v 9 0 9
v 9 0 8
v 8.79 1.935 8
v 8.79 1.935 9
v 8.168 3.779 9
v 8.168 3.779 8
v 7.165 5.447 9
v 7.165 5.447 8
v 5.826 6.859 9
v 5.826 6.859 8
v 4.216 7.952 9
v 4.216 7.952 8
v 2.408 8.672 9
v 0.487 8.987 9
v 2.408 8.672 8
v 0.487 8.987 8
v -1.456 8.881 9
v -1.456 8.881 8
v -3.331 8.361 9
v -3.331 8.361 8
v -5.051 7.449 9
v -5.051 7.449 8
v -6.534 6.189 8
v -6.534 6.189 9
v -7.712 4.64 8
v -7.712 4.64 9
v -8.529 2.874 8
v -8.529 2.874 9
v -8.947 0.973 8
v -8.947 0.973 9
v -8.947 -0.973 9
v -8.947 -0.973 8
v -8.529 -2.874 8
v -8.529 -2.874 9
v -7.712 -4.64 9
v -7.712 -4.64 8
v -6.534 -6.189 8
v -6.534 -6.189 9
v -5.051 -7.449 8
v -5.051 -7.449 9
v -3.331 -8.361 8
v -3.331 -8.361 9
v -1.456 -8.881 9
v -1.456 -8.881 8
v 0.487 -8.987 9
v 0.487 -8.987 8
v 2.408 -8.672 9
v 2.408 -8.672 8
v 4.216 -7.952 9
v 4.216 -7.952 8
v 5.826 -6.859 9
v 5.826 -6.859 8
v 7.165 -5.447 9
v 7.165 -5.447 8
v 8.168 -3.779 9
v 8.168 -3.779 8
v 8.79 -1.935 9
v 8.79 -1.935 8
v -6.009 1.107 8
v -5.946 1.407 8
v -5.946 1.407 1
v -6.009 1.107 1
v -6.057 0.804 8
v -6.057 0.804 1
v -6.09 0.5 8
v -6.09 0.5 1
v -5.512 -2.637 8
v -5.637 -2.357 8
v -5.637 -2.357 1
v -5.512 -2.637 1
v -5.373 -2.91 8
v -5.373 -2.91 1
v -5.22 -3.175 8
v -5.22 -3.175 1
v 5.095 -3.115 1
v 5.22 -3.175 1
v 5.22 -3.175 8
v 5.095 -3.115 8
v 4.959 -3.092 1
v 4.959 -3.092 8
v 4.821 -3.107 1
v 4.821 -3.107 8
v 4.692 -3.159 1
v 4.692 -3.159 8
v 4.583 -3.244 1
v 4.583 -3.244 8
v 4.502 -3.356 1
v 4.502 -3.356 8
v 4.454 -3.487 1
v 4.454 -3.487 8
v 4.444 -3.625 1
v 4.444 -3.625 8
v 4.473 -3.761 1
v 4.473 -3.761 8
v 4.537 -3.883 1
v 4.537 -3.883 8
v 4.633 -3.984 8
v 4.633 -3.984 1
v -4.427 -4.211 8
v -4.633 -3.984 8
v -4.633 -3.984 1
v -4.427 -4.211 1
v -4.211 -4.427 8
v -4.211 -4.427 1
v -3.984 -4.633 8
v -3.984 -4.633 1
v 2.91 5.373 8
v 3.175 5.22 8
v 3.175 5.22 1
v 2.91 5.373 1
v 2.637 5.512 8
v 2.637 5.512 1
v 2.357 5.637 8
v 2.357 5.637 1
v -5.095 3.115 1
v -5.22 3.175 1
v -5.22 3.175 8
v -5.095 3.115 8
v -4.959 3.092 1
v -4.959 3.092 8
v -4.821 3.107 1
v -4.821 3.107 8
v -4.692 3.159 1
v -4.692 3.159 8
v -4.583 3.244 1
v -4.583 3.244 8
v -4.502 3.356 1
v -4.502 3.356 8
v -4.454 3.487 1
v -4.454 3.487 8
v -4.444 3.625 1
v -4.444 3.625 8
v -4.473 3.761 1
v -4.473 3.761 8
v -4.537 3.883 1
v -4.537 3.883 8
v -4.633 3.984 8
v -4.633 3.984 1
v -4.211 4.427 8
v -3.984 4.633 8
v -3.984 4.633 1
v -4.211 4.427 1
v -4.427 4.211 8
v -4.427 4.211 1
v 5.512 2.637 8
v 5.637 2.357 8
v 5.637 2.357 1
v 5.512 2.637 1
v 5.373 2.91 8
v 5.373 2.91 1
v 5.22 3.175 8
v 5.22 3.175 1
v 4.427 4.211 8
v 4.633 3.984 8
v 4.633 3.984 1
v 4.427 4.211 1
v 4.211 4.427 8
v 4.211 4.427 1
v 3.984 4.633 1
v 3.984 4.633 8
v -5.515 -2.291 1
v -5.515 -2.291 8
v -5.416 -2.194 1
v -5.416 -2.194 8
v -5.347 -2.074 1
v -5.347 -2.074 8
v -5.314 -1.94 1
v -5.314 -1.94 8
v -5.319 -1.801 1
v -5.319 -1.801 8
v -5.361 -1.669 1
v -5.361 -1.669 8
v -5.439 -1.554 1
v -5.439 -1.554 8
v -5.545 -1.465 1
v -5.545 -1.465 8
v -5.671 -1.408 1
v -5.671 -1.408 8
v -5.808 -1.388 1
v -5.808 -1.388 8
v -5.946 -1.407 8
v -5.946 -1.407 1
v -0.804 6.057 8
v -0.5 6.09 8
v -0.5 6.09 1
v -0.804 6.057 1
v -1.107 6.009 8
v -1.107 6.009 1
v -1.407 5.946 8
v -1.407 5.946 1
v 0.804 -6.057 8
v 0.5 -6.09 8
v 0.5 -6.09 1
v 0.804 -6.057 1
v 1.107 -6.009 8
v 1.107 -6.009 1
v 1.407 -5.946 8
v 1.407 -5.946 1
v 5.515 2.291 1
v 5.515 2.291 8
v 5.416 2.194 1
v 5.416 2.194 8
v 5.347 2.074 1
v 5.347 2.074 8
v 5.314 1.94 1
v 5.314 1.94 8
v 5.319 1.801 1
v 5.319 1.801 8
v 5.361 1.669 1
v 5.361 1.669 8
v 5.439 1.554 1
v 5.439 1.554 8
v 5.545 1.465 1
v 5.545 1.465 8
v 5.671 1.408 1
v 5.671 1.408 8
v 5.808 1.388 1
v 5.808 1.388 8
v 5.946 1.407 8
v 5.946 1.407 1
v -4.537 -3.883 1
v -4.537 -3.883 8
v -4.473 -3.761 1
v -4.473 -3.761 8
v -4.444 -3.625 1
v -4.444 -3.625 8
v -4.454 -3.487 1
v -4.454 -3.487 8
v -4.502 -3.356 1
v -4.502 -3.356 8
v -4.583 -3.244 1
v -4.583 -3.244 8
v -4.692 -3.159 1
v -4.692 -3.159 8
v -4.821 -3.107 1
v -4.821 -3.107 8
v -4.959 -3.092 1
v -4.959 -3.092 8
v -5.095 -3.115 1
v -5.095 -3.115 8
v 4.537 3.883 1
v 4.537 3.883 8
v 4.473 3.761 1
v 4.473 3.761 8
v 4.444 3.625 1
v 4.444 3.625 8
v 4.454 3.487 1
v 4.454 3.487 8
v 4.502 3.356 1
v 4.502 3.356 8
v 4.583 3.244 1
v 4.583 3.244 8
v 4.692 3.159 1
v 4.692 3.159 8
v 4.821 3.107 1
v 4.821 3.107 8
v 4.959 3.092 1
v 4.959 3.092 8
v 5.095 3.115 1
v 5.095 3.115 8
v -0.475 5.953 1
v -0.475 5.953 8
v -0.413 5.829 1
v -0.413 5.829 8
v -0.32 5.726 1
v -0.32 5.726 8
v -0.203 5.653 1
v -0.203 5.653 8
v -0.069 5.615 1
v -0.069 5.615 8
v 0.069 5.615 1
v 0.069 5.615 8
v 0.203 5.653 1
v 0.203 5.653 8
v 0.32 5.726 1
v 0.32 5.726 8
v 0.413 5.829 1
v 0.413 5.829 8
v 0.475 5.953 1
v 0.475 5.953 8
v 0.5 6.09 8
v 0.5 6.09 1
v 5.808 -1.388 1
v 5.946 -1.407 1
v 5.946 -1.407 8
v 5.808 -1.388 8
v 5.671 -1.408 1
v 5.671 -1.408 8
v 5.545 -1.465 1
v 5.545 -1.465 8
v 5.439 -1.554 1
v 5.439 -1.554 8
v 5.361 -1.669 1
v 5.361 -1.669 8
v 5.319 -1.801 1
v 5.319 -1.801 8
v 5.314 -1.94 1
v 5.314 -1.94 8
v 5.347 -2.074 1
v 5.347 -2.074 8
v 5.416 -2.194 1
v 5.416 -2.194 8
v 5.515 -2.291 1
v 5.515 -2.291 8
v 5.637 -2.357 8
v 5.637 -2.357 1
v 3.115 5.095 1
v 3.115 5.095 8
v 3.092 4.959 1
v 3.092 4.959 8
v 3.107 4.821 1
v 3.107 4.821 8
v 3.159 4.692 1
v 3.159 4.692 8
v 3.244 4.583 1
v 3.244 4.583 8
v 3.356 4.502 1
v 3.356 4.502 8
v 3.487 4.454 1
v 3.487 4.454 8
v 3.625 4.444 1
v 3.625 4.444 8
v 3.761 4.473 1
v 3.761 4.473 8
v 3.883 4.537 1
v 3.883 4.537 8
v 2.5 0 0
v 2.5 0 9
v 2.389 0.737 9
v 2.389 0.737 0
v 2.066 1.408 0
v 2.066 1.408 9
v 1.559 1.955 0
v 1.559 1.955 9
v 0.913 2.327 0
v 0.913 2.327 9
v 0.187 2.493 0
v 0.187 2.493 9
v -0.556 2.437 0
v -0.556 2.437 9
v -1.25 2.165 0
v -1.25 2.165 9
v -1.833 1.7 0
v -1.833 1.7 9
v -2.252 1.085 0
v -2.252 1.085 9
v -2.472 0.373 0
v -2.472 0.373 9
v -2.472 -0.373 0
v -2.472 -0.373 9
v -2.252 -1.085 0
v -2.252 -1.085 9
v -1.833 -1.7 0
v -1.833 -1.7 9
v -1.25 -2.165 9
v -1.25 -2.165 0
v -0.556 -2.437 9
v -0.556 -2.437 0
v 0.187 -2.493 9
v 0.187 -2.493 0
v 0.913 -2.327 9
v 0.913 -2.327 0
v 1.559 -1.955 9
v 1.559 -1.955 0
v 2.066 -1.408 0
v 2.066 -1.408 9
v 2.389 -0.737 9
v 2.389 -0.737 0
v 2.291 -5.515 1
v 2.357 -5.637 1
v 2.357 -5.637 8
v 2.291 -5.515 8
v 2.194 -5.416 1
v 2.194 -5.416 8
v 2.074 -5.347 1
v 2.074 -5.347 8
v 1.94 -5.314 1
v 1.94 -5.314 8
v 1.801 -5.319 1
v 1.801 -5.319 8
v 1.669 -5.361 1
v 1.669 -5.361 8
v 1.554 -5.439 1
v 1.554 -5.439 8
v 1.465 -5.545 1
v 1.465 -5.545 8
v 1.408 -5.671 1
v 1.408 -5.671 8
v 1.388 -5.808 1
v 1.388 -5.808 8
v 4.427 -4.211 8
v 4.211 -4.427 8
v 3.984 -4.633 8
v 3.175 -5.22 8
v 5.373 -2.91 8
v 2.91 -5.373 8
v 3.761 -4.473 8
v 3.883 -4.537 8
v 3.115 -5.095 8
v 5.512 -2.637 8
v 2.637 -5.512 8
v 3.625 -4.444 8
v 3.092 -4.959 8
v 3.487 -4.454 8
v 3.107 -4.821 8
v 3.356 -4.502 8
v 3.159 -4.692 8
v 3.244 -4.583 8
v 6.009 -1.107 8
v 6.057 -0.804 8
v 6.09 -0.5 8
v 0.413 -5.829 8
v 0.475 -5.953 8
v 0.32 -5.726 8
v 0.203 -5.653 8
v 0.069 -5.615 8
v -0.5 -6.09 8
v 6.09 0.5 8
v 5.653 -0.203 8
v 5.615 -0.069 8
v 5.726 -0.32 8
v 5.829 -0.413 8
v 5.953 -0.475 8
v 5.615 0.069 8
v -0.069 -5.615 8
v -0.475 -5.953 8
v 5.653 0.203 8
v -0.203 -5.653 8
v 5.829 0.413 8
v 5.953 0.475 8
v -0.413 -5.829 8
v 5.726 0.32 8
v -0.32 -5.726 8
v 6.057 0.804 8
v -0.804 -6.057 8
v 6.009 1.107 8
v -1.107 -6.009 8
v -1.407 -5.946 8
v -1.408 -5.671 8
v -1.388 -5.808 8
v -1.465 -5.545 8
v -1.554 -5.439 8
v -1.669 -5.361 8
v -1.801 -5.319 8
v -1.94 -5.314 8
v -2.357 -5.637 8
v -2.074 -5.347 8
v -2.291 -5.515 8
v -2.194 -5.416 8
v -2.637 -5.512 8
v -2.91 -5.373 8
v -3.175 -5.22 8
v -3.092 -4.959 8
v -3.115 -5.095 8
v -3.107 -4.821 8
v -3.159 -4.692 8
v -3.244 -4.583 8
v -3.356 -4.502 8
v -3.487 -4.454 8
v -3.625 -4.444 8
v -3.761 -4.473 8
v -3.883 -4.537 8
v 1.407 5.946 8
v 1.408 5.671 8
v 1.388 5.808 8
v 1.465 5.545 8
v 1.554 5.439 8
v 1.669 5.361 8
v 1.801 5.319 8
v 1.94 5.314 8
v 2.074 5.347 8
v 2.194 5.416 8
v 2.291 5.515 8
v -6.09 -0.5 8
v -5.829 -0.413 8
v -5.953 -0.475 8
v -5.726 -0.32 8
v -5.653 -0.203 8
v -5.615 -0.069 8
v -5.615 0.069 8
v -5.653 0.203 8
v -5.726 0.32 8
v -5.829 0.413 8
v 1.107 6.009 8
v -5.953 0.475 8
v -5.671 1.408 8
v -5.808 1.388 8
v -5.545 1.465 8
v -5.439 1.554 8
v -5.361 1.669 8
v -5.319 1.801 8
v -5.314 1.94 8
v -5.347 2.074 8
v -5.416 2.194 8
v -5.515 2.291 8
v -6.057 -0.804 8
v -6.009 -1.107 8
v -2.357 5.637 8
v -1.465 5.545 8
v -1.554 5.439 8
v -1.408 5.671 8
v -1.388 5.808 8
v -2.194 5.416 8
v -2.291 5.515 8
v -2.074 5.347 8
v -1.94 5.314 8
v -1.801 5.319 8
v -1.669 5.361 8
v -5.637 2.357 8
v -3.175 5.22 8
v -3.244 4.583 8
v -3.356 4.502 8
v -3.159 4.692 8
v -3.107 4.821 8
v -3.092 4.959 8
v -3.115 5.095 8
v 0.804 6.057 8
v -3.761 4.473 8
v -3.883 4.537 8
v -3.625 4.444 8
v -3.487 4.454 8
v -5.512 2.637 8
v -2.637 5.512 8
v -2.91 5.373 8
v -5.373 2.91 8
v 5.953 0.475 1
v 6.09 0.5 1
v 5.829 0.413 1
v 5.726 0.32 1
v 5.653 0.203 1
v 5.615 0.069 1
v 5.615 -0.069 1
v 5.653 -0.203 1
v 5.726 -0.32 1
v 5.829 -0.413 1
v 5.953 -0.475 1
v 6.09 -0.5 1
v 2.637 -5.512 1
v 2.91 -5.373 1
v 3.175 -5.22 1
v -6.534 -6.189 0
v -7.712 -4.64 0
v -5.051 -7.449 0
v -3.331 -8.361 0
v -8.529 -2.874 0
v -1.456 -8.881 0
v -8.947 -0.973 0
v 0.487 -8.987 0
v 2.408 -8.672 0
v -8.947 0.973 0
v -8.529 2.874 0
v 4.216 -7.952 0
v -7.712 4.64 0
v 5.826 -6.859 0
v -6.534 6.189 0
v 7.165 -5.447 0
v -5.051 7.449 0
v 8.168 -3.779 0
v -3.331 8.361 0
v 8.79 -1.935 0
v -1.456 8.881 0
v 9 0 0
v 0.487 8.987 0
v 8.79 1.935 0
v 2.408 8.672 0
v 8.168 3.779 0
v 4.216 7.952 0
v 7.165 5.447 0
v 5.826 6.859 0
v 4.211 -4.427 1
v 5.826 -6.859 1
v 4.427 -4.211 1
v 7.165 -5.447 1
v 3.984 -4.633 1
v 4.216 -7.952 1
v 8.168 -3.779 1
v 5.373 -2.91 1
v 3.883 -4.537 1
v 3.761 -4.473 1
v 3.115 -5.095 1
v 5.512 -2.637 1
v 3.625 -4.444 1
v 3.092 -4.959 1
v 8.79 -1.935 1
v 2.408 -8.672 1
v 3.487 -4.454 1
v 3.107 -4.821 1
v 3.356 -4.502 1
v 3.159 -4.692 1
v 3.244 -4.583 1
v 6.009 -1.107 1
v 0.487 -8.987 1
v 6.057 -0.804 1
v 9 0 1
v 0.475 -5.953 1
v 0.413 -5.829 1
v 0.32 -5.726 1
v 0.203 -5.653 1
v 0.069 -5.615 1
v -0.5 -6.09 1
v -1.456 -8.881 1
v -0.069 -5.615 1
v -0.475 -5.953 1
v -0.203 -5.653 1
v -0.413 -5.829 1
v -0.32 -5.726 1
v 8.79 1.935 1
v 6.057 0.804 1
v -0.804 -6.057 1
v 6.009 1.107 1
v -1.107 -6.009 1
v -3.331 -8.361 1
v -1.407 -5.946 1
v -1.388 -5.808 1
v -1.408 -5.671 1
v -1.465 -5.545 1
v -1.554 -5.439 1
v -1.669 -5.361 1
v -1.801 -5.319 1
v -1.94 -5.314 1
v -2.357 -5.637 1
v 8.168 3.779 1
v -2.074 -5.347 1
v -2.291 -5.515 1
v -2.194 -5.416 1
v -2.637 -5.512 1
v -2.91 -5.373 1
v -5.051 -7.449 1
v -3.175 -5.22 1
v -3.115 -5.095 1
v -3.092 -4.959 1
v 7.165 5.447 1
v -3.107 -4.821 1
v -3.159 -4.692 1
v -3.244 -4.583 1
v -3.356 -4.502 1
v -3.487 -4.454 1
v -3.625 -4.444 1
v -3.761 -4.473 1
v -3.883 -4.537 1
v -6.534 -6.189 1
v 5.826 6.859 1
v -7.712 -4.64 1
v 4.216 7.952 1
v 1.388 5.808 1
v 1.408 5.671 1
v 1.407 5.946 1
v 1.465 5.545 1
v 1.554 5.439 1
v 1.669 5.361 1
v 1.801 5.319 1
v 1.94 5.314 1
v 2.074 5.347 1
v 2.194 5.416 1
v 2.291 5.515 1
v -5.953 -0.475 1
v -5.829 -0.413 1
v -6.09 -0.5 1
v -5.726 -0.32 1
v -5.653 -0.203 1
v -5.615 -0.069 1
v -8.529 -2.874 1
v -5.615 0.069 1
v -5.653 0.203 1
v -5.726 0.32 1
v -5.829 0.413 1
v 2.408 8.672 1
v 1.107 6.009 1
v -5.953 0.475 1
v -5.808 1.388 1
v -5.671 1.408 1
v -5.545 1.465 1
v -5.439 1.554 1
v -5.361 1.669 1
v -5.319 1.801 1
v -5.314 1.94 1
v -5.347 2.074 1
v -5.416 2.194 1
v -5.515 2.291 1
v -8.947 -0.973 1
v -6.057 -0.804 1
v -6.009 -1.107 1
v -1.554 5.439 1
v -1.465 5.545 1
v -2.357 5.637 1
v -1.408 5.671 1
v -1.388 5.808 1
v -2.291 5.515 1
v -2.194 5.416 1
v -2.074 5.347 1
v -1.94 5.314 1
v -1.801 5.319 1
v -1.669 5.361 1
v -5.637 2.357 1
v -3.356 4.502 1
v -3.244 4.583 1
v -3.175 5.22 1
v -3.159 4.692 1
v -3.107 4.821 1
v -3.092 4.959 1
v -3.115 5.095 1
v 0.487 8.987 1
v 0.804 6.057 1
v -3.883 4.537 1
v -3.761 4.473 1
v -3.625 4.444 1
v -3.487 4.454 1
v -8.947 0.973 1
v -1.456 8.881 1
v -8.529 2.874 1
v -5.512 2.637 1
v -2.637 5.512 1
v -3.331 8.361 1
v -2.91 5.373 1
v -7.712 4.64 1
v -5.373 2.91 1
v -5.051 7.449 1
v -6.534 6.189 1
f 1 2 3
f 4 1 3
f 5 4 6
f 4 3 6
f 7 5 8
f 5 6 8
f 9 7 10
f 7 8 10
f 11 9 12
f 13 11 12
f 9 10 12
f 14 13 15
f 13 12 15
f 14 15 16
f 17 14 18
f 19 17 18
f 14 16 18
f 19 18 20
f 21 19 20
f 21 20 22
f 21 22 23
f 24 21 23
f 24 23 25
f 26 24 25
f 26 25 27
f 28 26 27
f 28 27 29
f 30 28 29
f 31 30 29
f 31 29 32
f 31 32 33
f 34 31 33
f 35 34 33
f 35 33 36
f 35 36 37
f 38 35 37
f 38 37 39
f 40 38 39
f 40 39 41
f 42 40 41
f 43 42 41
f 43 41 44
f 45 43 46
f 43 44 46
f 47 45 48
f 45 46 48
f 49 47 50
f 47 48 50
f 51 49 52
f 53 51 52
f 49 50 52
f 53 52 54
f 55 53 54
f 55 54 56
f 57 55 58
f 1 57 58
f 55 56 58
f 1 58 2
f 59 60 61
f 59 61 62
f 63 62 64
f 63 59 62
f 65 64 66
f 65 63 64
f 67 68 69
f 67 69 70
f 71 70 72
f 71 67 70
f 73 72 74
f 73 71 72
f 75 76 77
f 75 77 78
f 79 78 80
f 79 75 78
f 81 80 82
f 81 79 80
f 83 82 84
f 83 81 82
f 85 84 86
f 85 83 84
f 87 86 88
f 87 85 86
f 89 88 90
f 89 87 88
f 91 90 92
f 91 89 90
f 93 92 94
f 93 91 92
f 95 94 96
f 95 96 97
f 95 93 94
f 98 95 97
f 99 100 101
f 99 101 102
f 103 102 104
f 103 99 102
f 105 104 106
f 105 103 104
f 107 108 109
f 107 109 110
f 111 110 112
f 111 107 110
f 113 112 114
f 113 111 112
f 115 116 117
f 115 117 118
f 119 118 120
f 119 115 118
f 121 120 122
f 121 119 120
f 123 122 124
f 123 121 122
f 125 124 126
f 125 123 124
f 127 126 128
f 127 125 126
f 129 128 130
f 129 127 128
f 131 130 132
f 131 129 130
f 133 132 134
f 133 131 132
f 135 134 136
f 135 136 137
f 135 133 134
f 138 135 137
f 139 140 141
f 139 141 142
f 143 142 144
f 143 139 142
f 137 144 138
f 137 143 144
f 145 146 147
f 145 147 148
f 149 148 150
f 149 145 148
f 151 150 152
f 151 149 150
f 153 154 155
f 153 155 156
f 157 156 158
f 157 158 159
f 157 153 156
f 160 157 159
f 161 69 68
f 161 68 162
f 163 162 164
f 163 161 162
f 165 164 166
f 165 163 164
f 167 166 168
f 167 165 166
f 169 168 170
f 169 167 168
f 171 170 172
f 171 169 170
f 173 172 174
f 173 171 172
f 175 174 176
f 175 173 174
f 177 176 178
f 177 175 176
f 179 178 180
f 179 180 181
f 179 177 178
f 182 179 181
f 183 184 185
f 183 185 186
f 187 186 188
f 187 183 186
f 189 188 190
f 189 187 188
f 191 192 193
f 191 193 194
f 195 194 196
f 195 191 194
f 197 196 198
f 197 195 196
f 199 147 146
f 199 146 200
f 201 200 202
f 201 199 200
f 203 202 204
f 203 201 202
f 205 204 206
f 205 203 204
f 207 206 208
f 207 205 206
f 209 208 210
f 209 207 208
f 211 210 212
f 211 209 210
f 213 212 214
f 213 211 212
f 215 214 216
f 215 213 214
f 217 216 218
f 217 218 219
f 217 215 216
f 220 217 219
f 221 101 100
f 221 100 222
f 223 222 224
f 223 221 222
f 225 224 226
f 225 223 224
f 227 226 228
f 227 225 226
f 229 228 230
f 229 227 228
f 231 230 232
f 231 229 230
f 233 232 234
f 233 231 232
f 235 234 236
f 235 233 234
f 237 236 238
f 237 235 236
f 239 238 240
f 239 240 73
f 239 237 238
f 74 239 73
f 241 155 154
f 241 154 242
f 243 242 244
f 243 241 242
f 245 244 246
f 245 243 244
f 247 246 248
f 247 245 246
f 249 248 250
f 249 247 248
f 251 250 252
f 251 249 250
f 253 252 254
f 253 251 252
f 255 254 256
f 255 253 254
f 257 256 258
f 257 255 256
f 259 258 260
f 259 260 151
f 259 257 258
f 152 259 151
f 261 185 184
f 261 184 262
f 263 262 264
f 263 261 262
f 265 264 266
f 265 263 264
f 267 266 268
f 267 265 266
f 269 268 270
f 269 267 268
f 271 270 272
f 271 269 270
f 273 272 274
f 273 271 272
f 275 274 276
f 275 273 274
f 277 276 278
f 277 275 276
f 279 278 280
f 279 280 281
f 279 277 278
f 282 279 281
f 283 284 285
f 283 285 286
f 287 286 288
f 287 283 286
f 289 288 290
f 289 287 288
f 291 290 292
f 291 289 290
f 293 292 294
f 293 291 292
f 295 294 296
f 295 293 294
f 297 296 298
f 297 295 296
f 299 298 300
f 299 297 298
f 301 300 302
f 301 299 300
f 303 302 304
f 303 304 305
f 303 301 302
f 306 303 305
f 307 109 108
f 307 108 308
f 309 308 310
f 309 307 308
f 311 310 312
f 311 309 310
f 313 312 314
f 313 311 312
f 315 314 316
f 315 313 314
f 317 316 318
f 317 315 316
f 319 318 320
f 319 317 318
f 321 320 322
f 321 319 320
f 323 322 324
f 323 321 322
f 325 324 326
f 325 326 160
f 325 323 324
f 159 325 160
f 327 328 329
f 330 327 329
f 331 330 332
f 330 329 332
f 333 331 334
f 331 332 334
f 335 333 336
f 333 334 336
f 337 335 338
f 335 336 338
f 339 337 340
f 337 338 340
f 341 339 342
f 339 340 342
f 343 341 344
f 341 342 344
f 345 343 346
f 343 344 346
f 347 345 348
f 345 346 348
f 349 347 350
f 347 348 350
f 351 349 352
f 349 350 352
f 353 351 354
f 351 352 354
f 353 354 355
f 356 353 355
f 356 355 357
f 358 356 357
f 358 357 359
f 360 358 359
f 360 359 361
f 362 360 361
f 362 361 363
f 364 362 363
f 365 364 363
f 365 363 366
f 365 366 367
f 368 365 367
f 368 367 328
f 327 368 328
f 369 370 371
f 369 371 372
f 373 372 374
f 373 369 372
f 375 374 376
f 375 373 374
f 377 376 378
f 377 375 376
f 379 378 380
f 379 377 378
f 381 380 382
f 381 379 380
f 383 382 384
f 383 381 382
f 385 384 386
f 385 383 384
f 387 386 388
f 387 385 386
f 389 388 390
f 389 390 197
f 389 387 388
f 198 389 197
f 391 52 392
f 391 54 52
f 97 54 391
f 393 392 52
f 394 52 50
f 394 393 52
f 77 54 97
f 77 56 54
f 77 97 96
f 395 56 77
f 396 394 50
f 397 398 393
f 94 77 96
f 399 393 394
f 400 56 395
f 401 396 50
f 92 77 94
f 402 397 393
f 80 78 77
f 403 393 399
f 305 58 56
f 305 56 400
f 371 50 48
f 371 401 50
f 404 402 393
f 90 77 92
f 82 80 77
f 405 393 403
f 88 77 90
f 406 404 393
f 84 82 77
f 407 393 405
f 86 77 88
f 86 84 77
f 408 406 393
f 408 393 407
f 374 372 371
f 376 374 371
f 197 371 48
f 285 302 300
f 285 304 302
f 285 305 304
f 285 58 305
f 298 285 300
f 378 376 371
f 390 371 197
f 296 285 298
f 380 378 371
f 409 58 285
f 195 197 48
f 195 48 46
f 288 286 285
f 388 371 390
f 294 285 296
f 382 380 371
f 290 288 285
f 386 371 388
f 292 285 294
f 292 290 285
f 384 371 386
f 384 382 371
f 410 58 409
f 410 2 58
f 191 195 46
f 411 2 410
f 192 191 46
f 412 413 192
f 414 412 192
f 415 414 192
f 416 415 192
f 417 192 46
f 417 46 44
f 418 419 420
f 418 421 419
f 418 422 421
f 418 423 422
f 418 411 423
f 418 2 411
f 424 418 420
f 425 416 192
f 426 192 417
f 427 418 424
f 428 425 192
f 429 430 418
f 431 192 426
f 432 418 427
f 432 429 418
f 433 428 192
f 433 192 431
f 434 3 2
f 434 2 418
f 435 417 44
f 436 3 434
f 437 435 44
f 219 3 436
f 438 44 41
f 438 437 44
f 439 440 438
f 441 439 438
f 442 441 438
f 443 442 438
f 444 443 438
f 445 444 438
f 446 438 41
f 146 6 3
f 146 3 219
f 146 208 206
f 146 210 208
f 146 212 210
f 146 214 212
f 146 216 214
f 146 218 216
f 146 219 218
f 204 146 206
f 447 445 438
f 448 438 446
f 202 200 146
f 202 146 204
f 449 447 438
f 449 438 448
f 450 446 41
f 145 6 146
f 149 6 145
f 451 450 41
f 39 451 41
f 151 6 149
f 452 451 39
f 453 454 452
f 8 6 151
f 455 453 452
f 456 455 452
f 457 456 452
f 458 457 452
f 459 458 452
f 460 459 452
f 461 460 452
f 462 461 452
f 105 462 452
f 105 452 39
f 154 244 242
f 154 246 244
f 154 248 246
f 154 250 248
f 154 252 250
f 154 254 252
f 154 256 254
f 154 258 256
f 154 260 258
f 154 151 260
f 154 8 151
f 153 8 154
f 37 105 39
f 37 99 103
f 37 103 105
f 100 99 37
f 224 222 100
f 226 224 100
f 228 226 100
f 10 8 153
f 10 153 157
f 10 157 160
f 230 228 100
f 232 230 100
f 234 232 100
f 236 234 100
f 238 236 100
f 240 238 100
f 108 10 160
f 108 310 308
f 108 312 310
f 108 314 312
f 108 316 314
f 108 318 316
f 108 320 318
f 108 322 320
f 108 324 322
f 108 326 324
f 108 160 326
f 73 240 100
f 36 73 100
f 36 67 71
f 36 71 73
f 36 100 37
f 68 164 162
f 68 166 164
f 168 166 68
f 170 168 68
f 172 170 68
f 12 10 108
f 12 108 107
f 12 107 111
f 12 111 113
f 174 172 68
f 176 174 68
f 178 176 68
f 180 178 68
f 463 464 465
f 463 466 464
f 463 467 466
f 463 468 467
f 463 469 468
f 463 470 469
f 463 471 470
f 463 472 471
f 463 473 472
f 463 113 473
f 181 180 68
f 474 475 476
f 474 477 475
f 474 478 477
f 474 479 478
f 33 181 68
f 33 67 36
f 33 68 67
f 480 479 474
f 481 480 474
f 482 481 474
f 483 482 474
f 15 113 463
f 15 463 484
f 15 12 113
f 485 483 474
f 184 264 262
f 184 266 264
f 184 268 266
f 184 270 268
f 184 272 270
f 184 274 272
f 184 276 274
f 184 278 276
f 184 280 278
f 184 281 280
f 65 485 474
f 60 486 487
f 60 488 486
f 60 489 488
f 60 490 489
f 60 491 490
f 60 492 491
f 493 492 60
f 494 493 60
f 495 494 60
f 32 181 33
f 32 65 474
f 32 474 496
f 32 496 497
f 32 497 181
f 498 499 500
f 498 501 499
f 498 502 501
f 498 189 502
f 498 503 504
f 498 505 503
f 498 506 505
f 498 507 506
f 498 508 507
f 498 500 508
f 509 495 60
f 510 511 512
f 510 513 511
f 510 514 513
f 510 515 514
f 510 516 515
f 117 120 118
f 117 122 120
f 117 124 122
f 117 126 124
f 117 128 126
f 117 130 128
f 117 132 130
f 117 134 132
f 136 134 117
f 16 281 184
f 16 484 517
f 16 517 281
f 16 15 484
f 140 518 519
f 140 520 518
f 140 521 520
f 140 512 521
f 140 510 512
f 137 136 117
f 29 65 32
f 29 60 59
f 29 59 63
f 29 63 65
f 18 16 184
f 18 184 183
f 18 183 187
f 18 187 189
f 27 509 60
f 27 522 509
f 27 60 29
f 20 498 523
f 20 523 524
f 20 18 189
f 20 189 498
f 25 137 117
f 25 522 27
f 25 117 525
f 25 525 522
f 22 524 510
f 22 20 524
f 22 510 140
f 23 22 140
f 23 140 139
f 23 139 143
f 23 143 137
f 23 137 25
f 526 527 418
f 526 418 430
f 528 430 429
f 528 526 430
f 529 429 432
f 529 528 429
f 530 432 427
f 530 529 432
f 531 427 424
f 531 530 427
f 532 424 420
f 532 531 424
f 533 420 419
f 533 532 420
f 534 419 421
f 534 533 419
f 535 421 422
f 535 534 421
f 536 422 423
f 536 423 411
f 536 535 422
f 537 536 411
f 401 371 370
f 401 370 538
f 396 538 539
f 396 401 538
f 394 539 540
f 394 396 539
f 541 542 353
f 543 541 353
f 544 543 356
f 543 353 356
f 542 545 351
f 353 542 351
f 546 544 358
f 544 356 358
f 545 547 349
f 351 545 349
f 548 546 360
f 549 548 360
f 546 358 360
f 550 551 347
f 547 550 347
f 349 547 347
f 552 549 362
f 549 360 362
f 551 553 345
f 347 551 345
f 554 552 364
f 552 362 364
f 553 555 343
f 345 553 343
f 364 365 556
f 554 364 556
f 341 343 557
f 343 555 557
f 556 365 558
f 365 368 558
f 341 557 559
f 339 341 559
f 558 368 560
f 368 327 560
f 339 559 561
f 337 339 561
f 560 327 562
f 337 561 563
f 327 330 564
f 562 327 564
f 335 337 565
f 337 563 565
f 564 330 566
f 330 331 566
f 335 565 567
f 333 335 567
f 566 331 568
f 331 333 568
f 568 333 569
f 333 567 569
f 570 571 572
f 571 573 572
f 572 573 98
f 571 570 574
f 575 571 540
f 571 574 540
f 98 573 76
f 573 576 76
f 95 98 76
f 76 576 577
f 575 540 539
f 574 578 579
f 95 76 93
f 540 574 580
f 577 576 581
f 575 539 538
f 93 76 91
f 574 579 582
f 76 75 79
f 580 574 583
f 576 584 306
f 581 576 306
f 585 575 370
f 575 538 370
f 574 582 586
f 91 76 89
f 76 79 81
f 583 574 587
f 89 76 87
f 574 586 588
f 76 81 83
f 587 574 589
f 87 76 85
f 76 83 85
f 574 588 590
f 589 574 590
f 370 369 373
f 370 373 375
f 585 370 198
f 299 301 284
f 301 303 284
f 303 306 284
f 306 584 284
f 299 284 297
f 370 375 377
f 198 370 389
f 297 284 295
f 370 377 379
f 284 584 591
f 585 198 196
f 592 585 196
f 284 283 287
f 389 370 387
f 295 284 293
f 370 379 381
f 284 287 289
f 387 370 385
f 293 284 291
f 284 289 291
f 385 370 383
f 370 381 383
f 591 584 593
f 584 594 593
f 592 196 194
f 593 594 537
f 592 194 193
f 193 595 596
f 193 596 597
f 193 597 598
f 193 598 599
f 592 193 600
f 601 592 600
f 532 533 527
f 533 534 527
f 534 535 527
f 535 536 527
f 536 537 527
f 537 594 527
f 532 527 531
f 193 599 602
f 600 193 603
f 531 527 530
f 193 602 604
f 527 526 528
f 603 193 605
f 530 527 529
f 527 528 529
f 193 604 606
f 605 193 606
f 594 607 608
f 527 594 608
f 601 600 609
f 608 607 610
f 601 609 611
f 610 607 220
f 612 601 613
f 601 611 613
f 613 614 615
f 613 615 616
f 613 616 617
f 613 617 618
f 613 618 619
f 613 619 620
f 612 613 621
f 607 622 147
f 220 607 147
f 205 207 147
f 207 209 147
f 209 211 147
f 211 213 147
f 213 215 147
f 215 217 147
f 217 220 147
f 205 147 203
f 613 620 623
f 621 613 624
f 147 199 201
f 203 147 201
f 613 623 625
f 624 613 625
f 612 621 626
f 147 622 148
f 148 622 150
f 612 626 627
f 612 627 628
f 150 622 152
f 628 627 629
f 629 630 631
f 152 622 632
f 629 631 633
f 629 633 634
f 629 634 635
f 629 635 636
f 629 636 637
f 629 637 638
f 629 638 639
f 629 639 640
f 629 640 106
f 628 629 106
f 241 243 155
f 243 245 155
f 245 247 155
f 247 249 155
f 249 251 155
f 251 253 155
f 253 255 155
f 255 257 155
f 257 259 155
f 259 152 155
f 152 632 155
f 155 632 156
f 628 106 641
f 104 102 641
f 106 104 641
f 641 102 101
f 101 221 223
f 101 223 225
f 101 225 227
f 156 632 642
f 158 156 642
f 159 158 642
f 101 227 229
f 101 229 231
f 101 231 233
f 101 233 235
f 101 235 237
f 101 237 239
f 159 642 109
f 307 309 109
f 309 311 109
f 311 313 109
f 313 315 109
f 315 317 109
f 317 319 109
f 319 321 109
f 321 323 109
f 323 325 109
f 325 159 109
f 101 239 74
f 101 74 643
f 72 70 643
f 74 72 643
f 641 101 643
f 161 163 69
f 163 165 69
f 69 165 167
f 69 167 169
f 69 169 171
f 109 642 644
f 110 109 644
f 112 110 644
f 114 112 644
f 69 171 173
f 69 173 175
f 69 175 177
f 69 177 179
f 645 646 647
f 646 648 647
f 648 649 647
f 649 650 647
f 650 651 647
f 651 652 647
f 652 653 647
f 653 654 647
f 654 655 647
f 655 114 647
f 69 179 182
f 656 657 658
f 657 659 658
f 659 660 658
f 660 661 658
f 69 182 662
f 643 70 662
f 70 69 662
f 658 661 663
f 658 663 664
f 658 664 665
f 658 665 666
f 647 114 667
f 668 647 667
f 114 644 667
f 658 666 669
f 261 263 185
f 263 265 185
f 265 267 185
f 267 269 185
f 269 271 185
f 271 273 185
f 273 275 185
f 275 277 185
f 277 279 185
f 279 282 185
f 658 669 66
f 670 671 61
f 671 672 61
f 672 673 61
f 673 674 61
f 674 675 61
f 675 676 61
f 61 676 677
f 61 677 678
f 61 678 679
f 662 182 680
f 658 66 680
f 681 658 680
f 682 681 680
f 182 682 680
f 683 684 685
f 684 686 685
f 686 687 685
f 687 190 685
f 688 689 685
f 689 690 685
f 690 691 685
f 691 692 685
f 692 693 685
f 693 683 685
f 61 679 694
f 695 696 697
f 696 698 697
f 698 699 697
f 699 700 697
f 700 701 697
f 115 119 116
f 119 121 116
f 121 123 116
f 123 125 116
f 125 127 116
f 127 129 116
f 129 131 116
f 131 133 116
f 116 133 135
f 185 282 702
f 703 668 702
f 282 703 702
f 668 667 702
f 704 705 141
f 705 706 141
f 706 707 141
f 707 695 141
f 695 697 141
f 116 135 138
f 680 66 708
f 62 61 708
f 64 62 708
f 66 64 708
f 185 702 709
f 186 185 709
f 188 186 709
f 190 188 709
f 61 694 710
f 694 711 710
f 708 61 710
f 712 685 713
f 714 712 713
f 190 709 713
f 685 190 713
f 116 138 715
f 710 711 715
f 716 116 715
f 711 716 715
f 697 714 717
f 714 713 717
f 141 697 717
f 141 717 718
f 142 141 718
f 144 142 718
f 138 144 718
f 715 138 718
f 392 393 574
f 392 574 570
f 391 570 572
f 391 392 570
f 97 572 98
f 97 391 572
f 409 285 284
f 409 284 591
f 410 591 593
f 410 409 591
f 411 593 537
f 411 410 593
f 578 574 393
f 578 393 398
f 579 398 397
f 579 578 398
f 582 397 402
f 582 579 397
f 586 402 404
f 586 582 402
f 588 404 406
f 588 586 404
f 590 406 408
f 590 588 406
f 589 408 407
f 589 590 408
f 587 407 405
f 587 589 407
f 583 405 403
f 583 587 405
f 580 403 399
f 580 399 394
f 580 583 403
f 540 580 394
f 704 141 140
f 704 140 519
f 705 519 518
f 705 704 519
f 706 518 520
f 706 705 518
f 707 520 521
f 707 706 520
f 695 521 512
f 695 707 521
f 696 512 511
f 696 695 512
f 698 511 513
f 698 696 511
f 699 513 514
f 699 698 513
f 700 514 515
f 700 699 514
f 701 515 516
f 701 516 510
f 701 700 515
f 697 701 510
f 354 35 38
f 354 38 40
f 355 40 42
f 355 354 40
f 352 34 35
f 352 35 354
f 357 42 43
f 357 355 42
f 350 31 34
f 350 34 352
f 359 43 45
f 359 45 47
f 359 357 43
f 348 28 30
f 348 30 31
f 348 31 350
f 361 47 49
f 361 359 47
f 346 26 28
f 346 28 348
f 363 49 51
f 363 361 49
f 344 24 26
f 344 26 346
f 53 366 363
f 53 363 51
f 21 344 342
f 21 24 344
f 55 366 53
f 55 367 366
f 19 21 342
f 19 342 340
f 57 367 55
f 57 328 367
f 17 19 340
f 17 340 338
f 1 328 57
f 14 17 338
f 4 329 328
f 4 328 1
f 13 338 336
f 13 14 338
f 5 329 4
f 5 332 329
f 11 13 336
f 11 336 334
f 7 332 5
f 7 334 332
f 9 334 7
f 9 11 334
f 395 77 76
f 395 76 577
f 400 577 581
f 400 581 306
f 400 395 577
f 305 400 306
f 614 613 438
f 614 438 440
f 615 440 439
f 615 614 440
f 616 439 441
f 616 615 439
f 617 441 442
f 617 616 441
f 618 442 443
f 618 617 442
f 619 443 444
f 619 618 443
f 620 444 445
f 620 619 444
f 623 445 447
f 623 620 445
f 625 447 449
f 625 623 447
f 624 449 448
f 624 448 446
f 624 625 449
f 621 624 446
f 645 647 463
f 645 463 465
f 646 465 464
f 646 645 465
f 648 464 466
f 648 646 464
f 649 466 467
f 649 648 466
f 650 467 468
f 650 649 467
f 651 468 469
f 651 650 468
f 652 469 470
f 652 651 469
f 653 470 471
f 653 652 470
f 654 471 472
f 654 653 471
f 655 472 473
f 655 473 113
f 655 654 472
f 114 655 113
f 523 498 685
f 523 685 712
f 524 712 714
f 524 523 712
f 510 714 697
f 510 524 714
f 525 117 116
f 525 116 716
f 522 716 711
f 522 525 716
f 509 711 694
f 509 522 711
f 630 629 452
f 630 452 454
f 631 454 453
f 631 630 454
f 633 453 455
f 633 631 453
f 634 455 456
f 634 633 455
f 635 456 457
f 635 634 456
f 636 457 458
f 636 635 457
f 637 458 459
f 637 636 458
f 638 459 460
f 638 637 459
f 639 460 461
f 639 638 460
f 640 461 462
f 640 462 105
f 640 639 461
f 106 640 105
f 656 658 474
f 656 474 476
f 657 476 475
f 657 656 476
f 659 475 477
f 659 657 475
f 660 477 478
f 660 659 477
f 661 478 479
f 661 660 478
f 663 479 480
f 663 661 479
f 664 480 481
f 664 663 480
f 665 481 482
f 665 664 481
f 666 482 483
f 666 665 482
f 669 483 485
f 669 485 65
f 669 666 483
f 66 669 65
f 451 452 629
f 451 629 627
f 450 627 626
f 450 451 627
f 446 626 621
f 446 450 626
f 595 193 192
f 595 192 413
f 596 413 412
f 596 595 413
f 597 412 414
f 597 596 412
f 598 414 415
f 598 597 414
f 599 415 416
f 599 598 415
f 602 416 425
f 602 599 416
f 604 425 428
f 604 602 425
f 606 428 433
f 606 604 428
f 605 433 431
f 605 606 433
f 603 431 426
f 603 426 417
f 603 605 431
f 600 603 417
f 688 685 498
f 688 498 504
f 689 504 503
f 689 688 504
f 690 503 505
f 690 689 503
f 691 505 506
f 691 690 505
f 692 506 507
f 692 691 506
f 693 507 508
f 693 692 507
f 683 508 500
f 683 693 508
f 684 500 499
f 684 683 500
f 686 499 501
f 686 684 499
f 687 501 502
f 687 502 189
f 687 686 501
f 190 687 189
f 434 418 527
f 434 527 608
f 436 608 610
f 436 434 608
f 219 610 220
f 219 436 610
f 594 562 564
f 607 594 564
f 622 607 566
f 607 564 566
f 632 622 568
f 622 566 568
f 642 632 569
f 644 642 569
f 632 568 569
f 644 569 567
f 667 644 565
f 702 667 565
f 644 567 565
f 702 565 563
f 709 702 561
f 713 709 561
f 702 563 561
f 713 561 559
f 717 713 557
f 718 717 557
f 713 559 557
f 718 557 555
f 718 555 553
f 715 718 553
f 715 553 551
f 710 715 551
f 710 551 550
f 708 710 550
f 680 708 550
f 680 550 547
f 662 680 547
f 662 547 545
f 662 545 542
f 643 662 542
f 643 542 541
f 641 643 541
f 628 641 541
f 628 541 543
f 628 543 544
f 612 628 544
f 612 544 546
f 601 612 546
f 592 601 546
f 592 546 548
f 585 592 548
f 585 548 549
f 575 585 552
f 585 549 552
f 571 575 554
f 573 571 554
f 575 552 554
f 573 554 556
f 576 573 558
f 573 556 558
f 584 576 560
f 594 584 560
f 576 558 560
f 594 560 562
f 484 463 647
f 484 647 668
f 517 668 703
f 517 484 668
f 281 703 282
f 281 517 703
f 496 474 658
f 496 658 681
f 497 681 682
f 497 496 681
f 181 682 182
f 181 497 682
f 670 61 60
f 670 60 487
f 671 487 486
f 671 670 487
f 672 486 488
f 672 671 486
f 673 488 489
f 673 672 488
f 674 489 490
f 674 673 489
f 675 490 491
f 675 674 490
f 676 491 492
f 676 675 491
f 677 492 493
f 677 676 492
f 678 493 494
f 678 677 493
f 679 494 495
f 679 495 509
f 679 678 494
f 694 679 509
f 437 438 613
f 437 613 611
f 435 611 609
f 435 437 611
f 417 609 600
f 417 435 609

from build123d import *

# Parameters (mm, degrees)
SKETCH_R           = 9
PAD_DEPTH          = 9
SKETCH001_W        = 2.89
SKETCH001_H        = 7
SKETCH002_R        = 2.5
POCKET_DEPTH       = 9.001
POCKET001_DEPTH    = 7
POLARPATTERN_COUNT = 20


with BuildPart() as part:
    # Sketch → Pad (new body)
    with BuildSketch(Plane.XY):
        Circle(SKETCH_R)
    extrude(amount=PAD_DEPTH)

    # Sketch001 → Groove (revolve, cut)
    with BuildSketch(Plane.XZ):
        with Locations((7.555, 4.5)):
            Rectangle(SKETCH001_W, SKETCH001_H)
    revolve(axis=Axis((0, 0, 0), (0, 0, 1)), mode=Mode.SUBTRACT)

    # Sketch002 (on Face7 of Groove) → Pocket (cut, through all)
    with BuildSketch(Plane.XY.offset(9)):
        Circle(SKETCH002_R)
    extrude(amount=-POCKET_DEPTH, mode=Mode.SUBTRACT)

    # Sketch003 (on Face3 of Groove) → Pocket001 (cut)
    with BuildSketch(Plane.XY.offset(1)):
        with BuildLine():
            ThreePointArc((6.089542, 0.499581), (5.61, 0), (6.089542, -0.499581))
            ThreePointArc((6.089542, -0.499581), (6.11, 0), (6.089542, 0.499581))
        make_face()
    pocket001 = extrude(amount=POCKET001_DEPTH, mode=Mode.SUBTRACT)

    # PolarPattern: Pocket001 ×20 about axis
    polarpattern_axis = Axis((0, 0, 1), (0, 0, 1))
    for i in range(1, POLARPATTERN_COUNT):
        add(pocket001.rotate(polarpattern_axis, i * 360 / POLARPATTERN_COUNT), mode=Mode.SUBTRACT)


solid = part.part
